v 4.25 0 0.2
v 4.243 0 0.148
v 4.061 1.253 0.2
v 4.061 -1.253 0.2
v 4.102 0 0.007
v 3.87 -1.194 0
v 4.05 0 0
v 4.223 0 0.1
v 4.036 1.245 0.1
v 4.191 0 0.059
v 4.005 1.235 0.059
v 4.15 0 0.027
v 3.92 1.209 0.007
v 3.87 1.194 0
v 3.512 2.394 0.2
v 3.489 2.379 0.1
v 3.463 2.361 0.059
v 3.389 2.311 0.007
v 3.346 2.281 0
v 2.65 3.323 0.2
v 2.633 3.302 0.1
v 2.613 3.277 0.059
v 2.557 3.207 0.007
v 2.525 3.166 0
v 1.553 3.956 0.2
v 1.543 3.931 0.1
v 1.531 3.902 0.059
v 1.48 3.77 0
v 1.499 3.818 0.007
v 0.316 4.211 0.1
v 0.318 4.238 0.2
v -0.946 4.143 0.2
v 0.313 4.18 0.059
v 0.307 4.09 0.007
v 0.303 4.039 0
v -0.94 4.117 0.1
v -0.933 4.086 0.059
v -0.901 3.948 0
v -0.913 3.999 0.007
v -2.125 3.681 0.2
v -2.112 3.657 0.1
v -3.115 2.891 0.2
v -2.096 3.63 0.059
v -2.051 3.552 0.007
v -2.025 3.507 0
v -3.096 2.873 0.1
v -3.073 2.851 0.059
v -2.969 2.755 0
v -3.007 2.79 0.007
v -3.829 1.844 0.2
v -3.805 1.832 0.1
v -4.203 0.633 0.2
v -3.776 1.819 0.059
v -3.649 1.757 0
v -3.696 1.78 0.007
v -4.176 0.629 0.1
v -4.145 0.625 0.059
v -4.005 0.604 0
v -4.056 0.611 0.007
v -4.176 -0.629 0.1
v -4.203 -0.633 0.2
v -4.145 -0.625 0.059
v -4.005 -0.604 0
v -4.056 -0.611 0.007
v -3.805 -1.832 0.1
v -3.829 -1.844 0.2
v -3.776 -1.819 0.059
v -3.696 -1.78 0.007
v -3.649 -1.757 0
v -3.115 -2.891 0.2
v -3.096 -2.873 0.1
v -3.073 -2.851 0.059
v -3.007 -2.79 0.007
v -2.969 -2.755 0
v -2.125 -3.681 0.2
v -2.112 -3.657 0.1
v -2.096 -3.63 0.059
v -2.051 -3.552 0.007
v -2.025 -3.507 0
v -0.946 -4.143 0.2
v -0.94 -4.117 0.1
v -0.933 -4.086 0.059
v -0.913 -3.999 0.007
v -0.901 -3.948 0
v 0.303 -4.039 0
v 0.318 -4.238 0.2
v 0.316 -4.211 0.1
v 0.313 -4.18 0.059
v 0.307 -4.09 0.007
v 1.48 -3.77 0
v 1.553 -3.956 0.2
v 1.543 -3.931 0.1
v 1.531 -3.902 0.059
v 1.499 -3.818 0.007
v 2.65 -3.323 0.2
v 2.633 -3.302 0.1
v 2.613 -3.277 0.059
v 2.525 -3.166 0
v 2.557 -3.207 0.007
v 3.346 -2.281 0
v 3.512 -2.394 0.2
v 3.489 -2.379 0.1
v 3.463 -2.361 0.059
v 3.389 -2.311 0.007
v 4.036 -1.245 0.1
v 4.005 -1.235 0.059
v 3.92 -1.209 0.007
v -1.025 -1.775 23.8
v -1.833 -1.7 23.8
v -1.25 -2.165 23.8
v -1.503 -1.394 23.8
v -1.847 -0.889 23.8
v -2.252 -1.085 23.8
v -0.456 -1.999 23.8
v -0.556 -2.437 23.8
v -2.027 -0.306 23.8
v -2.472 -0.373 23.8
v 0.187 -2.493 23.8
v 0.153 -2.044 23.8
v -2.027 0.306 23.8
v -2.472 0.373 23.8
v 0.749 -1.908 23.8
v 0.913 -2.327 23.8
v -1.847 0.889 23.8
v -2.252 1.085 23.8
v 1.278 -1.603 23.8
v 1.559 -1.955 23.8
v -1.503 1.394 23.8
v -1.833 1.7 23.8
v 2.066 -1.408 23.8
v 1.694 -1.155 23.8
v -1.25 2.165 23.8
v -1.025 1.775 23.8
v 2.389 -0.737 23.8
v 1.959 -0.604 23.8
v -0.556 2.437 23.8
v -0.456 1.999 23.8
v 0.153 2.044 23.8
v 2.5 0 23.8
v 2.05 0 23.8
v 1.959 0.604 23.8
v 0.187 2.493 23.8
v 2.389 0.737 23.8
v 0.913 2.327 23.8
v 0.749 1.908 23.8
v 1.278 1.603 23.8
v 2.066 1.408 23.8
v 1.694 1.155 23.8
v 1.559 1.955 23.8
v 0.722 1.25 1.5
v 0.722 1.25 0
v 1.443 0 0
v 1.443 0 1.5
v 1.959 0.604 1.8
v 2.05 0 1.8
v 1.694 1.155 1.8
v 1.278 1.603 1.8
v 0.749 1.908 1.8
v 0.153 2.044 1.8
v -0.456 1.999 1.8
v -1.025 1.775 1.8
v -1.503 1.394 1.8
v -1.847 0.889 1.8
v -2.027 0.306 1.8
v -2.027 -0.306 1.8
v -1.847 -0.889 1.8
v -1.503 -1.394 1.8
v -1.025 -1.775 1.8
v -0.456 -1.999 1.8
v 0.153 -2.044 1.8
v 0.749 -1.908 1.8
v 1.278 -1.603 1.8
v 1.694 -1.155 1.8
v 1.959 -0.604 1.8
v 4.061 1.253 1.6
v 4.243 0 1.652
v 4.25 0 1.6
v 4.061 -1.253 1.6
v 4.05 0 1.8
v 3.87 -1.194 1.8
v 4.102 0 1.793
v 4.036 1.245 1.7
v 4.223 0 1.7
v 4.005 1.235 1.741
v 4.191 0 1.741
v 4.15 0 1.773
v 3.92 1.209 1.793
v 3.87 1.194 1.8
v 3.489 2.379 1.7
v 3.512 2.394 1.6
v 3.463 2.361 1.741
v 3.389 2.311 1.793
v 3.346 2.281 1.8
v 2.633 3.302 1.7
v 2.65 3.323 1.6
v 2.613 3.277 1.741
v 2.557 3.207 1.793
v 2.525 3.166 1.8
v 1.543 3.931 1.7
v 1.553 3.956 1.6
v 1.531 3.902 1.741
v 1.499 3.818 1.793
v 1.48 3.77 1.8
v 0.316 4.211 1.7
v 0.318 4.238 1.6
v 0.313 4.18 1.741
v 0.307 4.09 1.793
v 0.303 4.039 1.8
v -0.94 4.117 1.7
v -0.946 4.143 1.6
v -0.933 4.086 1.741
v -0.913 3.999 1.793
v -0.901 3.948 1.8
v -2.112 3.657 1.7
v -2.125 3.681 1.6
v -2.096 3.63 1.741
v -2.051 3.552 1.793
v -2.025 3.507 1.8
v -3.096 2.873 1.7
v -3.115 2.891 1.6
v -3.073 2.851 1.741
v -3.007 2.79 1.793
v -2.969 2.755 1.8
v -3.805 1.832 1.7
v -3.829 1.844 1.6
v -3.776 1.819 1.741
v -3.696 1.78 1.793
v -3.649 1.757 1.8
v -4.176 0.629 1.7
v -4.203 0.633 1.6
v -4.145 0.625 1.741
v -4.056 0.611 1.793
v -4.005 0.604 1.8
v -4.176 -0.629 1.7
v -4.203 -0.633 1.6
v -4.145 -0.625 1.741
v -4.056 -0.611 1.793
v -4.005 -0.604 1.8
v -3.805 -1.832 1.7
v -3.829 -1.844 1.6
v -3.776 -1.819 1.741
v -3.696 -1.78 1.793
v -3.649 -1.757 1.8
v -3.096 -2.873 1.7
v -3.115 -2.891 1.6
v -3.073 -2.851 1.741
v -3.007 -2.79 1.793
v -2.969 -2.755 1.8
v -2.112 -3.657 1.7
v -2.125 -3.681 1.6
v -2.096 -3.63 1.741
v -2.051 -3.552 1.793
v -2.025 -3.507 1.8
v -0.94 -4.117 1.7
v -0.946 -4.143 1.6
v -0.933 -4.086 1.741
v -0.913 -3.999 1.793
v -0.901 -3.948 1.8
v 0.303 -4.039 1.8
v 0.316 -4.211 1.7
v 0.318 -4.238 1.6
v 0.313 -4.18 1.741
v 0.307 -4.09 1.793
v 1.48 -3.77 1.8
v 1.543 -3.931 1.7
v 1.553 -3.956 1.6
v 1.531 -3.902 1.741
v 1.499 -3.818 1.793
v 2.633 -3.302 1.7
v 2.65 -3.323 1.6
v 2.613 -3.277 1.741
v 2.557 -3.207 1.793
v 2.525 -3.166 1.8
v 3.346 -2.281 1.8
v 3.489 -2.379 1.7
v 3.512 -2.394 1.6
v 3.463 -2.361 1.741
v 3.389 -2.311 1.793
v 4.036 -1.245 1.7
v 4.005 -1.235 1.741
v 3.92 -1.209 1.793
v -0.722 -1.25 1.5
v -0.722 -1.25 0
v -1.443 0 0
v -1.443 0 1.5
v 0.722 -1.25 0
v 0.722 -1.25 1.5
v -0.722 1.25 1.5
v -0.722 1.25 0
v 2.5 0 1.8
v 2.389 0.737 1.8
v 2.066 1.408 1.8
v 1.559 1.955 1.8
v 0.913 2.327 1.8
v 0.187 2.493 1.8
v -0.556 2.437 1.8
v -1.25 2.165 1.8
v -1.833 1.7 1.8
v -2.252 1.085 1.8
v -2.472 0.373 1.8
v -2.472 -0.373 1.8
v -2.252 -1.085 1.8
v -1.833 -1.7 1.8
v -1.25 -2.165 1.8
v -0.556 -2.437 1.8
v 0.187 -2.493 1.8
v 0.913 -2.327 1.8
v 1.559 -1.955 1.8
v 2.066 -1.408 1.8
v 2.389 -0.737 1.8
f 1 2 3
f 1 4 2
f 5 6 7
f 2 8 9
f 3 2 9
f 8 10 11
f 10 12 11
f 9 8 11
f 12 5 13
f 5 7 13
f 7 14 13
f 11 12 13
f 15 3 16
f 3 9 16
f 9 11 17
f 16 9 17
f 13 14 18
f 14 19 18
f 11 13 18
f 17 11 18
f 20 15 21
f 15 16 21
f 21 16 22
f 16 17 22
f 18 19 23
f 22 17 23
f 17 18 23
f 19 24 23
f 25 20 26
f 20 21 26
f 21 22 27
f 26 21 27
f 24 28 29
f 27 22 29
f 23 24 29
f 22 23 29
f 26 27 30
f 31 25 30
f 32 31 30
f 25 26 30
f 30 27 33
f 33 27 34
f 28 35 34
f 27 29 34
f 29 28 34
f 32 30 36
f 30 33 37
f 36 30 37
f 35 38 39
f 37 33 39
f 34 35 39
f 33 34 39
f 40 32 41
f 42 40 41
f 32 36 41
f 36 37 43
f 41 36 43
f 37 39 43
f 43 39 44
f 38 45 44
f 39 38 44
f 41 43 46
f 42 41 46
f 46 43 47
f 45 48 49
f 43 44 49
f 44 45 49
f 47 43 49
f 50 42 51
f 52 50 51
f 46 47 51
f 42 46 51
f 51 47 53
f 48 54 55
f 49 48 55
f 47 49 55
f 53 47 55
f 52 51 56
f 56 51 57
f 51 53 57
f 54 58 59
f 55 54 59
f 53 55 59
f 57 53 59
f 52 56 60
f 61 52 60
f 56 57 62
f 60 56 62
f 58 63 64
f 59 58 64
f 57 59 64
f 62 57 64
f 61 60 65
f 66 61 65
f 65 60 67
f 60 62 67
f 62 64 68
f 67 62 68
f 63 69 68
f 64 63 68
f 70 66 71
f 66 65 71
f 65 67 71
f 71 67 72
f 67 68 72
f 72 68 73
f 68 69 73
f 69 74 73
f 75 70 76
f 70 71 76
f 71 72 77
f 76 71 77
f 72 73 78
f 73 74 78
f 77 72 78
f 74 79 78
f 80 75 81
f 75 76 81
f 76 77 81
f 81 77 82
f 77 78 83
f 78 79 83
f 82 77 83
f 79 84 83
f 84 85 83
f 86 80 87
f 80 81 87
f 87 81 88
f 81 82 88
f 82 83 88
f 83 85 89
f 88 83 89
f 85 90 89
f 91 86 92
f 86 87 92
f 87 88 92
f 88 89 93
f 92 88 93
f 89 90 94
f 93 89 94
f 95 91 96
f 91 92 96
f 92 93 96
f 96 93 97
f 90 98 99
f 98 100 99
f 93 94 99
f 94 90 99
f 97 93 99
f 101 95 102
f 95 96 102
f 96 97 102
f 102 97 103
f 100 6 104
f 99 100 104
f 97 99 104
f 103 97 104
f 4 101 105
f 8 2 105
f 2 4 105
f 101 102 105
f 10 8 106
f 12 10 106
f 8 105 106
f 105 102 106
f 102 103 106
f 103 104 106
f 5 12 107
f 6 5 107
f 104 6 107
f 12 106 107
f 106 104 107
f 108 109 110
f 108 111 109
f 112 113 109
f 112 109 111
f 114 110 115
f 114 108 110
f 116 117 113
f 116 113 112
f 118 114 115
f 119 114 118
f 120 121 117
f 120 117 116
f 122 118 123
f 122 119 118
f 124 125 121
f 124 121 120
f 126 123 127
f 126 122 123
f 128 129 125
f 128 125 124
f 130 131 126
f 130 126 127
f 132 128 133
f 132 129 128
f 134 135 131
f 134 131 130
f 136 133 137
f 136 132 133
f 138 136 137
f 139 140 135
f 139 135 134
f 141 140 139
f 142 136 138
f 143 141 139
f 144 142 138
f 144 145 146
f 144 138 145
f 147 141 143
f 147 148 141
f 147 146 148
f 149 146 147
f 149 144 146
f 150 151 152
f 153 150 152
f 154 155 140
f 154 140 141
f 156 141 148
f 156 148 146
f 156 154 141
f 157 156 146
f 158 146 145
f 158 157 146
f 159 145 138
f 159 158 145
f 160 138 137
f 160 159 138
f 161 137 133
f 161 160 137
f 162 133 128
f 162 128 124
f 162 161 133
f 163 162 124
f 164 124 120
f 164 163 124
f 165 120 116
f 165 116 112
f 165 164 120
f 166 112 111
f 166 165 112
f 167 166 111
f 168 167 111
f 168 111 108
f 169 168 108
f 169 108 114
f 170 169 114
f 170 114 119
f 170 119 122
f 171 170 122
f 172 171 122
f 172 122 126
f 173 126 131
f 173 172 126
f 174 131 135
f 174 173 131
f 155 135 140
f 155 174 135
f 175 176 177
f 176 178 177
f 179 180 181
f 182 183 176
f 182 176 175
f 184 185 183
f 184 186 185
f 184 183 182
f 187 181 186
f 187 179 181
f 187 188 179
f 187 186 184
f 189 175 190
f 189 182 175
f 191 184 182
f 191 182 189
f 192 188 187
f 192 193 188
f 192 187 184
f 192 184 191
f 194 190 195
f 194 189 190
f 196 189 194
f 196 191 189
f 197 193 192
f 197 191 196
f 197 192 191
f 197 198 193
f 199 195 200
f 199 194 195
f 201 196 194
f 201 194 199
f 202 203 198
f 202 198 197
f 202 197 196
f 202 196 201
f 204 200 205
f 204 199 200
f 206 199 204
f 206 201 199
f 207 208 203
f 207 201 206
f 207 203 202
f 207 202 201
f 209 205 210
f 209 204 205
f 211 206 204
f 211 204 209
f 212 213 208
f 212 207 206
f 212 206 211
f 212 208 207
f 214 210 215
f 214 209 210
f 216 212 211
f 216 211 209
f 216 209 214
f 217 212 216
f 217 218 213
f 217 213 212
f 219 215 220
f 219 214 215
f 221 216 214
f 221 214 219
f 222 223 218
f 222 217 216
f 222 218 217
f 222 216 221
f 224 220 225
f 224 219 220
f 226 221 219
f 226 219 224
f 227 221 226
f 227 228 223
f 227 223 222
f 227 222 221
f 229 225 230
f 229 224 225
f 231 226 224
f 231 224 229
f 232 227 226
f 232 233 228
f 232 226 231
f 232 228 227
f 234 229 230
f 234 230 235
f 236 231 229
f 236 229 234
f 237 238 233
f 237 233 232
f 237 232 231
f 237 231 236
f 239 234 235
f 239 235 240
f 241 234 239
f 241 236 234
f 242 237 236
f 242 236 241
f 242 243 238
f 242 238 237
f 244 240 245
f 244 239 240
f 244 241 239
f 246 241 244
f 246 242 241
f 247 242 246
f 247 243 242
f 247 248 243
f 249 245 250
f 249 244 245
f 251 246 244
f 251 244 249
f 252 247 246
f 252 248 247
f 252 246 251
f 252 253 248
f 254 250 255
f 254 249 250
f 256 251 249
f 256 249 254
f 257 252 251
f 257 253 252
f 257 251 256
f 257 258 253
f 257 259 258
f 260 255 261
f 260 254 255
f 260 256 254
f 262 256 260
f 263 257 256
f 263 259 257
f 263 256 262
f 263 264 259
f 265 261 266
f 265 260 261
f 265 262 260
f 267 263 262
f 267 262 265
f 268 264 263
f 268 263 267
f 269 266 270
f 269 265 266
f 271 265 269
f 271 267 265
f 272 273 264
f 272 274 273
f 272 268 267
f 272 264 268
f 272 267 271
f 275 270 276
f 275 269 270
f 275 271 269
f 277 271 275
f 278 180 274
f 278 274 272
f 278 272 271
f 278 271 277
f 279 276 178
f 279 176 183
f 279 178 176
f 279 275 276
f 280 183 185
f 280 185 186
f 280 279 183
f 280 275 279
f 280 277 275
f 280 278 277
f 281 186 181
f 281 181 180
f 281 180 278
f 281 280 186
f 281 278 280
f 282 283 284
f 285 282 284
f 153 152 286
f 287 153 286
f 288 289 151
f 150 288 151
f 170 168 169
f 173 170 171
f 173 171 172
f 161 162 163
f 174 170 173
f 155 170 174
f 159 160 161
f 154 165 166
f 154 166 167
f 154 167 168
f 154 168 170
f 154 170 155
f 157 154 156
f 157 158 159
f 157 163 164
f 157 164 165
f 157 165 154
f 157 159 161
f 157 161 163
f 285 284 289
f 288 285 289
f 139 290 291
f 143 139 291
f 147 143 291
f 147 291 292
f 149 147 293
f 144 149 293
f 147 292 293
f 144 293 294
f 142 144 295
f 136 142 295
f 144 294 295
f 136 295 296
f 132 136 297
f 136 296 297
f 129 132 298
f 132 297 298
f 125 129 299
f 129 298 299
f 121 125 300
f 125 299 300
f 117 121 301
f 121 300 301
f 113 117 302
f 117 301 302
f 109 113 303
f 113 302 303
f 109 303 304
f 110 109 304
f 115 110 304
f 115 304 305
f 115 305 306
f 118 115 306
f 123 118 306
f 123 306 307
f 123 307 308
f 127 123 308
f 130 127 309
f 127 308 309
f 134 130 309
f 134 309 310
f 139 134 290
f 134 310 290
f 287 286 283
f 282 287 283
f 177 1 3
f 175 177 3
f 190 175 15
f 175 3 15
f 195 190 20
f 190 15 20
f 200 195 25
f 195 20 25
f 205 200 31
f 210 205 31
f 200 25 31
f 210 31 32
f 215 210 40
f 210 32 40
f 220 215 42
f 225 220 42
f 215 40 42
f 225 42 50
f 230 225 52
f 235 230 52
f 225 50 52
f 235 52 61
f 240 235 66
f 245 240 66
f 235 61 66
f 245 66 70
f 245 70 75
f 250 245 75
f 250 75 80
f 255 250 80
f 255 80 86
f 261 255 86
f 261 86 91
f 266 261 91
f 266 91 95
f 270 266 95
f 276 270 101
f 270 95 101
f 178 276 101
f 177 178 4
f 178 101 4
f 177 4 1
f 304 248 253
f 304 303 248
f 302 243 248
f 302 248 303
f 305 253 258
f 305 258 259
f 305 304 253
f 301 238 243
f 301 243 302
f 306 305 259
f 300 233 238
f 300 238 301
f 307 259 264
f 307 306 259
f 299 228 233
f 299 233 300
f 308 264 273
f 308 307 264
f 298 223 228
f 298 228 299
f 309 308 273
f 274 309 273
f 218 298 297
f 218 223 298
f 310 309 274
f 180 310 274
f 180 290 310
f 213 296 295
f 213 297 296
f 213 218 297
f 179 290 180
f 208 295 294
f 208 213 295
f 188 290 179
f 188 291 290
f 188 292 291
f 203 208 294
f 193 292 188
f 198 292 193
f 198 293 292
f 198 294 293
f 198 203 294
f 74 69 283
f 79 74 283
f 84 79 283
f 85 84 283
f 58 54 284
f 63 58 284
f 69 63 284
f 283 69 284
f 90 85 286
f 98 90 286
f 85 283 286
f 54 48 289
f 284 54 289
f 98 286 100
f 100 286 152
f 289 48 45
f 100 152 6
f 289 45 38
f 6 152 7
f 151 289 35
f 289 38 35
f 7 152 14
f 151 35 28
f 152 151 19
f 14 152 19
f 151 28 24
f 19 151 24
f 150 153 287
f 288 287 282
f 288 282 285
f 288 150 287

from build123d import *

# Parameters (mm, degrees)
SKETCH_1_R          = 4.25
EXTRUDE_1_DEPTH     = 1.8
SKETCH_2_R          = 2.5
SKETCH_2_R_2        = 2.05
EXTRUDE_2_DEPTH     = 22
FILLET_1_R          = 0.2
CUT_EXTRUDE_1_DEPTH = 1.5


with BuildPart() as part:
    # 草图1 → 凸台-拉伸1 (new body)
    with BuildSketch(Plane.XY):
        Circle(SKETCH_1_R)
    extrude(amount=EXTRUDE_1_DEPTH)

    # 草图2 → 凸台-拉伸2 (add)
    with BuildSketch(Plane.XY.offset(1.8)):
        Circle(SKETCH_2_R)
        Circle(SKETCH_2_R_2, mode=Mode.SUBTRACT)
    extrude(amount=EXTRUDE_2_DEPTH)

    # 圆角1
    fillet_1_edges = [part.edges().sort_by_distance(p)[0] for p in [
        (-4.25, 0, 0),
        (-4.25, 0, 1.8),
    ]]
    fillet(fillet_1_edges, radius=FILLET_1_R)

    # 草图3 → 切除-拉伸1 (cut)
    with BuildSketch(Plane(origin=(0, 0, 0), x_dir=(-1, 0, 0), z_dir=(0, 0, -1))):
        Polygon((1.443375673, 0), (0.721687836, 1.25), (-0.721687836, 1.25), (-1.443375673, 0), (-0.721687836, -1.25), (0.721687836, -1.25), align=None)
    extrude(amount=-CUT_EXTRUDE_1_DEPTH, mode=Mode.SUBTRACT)


solid = part.part
